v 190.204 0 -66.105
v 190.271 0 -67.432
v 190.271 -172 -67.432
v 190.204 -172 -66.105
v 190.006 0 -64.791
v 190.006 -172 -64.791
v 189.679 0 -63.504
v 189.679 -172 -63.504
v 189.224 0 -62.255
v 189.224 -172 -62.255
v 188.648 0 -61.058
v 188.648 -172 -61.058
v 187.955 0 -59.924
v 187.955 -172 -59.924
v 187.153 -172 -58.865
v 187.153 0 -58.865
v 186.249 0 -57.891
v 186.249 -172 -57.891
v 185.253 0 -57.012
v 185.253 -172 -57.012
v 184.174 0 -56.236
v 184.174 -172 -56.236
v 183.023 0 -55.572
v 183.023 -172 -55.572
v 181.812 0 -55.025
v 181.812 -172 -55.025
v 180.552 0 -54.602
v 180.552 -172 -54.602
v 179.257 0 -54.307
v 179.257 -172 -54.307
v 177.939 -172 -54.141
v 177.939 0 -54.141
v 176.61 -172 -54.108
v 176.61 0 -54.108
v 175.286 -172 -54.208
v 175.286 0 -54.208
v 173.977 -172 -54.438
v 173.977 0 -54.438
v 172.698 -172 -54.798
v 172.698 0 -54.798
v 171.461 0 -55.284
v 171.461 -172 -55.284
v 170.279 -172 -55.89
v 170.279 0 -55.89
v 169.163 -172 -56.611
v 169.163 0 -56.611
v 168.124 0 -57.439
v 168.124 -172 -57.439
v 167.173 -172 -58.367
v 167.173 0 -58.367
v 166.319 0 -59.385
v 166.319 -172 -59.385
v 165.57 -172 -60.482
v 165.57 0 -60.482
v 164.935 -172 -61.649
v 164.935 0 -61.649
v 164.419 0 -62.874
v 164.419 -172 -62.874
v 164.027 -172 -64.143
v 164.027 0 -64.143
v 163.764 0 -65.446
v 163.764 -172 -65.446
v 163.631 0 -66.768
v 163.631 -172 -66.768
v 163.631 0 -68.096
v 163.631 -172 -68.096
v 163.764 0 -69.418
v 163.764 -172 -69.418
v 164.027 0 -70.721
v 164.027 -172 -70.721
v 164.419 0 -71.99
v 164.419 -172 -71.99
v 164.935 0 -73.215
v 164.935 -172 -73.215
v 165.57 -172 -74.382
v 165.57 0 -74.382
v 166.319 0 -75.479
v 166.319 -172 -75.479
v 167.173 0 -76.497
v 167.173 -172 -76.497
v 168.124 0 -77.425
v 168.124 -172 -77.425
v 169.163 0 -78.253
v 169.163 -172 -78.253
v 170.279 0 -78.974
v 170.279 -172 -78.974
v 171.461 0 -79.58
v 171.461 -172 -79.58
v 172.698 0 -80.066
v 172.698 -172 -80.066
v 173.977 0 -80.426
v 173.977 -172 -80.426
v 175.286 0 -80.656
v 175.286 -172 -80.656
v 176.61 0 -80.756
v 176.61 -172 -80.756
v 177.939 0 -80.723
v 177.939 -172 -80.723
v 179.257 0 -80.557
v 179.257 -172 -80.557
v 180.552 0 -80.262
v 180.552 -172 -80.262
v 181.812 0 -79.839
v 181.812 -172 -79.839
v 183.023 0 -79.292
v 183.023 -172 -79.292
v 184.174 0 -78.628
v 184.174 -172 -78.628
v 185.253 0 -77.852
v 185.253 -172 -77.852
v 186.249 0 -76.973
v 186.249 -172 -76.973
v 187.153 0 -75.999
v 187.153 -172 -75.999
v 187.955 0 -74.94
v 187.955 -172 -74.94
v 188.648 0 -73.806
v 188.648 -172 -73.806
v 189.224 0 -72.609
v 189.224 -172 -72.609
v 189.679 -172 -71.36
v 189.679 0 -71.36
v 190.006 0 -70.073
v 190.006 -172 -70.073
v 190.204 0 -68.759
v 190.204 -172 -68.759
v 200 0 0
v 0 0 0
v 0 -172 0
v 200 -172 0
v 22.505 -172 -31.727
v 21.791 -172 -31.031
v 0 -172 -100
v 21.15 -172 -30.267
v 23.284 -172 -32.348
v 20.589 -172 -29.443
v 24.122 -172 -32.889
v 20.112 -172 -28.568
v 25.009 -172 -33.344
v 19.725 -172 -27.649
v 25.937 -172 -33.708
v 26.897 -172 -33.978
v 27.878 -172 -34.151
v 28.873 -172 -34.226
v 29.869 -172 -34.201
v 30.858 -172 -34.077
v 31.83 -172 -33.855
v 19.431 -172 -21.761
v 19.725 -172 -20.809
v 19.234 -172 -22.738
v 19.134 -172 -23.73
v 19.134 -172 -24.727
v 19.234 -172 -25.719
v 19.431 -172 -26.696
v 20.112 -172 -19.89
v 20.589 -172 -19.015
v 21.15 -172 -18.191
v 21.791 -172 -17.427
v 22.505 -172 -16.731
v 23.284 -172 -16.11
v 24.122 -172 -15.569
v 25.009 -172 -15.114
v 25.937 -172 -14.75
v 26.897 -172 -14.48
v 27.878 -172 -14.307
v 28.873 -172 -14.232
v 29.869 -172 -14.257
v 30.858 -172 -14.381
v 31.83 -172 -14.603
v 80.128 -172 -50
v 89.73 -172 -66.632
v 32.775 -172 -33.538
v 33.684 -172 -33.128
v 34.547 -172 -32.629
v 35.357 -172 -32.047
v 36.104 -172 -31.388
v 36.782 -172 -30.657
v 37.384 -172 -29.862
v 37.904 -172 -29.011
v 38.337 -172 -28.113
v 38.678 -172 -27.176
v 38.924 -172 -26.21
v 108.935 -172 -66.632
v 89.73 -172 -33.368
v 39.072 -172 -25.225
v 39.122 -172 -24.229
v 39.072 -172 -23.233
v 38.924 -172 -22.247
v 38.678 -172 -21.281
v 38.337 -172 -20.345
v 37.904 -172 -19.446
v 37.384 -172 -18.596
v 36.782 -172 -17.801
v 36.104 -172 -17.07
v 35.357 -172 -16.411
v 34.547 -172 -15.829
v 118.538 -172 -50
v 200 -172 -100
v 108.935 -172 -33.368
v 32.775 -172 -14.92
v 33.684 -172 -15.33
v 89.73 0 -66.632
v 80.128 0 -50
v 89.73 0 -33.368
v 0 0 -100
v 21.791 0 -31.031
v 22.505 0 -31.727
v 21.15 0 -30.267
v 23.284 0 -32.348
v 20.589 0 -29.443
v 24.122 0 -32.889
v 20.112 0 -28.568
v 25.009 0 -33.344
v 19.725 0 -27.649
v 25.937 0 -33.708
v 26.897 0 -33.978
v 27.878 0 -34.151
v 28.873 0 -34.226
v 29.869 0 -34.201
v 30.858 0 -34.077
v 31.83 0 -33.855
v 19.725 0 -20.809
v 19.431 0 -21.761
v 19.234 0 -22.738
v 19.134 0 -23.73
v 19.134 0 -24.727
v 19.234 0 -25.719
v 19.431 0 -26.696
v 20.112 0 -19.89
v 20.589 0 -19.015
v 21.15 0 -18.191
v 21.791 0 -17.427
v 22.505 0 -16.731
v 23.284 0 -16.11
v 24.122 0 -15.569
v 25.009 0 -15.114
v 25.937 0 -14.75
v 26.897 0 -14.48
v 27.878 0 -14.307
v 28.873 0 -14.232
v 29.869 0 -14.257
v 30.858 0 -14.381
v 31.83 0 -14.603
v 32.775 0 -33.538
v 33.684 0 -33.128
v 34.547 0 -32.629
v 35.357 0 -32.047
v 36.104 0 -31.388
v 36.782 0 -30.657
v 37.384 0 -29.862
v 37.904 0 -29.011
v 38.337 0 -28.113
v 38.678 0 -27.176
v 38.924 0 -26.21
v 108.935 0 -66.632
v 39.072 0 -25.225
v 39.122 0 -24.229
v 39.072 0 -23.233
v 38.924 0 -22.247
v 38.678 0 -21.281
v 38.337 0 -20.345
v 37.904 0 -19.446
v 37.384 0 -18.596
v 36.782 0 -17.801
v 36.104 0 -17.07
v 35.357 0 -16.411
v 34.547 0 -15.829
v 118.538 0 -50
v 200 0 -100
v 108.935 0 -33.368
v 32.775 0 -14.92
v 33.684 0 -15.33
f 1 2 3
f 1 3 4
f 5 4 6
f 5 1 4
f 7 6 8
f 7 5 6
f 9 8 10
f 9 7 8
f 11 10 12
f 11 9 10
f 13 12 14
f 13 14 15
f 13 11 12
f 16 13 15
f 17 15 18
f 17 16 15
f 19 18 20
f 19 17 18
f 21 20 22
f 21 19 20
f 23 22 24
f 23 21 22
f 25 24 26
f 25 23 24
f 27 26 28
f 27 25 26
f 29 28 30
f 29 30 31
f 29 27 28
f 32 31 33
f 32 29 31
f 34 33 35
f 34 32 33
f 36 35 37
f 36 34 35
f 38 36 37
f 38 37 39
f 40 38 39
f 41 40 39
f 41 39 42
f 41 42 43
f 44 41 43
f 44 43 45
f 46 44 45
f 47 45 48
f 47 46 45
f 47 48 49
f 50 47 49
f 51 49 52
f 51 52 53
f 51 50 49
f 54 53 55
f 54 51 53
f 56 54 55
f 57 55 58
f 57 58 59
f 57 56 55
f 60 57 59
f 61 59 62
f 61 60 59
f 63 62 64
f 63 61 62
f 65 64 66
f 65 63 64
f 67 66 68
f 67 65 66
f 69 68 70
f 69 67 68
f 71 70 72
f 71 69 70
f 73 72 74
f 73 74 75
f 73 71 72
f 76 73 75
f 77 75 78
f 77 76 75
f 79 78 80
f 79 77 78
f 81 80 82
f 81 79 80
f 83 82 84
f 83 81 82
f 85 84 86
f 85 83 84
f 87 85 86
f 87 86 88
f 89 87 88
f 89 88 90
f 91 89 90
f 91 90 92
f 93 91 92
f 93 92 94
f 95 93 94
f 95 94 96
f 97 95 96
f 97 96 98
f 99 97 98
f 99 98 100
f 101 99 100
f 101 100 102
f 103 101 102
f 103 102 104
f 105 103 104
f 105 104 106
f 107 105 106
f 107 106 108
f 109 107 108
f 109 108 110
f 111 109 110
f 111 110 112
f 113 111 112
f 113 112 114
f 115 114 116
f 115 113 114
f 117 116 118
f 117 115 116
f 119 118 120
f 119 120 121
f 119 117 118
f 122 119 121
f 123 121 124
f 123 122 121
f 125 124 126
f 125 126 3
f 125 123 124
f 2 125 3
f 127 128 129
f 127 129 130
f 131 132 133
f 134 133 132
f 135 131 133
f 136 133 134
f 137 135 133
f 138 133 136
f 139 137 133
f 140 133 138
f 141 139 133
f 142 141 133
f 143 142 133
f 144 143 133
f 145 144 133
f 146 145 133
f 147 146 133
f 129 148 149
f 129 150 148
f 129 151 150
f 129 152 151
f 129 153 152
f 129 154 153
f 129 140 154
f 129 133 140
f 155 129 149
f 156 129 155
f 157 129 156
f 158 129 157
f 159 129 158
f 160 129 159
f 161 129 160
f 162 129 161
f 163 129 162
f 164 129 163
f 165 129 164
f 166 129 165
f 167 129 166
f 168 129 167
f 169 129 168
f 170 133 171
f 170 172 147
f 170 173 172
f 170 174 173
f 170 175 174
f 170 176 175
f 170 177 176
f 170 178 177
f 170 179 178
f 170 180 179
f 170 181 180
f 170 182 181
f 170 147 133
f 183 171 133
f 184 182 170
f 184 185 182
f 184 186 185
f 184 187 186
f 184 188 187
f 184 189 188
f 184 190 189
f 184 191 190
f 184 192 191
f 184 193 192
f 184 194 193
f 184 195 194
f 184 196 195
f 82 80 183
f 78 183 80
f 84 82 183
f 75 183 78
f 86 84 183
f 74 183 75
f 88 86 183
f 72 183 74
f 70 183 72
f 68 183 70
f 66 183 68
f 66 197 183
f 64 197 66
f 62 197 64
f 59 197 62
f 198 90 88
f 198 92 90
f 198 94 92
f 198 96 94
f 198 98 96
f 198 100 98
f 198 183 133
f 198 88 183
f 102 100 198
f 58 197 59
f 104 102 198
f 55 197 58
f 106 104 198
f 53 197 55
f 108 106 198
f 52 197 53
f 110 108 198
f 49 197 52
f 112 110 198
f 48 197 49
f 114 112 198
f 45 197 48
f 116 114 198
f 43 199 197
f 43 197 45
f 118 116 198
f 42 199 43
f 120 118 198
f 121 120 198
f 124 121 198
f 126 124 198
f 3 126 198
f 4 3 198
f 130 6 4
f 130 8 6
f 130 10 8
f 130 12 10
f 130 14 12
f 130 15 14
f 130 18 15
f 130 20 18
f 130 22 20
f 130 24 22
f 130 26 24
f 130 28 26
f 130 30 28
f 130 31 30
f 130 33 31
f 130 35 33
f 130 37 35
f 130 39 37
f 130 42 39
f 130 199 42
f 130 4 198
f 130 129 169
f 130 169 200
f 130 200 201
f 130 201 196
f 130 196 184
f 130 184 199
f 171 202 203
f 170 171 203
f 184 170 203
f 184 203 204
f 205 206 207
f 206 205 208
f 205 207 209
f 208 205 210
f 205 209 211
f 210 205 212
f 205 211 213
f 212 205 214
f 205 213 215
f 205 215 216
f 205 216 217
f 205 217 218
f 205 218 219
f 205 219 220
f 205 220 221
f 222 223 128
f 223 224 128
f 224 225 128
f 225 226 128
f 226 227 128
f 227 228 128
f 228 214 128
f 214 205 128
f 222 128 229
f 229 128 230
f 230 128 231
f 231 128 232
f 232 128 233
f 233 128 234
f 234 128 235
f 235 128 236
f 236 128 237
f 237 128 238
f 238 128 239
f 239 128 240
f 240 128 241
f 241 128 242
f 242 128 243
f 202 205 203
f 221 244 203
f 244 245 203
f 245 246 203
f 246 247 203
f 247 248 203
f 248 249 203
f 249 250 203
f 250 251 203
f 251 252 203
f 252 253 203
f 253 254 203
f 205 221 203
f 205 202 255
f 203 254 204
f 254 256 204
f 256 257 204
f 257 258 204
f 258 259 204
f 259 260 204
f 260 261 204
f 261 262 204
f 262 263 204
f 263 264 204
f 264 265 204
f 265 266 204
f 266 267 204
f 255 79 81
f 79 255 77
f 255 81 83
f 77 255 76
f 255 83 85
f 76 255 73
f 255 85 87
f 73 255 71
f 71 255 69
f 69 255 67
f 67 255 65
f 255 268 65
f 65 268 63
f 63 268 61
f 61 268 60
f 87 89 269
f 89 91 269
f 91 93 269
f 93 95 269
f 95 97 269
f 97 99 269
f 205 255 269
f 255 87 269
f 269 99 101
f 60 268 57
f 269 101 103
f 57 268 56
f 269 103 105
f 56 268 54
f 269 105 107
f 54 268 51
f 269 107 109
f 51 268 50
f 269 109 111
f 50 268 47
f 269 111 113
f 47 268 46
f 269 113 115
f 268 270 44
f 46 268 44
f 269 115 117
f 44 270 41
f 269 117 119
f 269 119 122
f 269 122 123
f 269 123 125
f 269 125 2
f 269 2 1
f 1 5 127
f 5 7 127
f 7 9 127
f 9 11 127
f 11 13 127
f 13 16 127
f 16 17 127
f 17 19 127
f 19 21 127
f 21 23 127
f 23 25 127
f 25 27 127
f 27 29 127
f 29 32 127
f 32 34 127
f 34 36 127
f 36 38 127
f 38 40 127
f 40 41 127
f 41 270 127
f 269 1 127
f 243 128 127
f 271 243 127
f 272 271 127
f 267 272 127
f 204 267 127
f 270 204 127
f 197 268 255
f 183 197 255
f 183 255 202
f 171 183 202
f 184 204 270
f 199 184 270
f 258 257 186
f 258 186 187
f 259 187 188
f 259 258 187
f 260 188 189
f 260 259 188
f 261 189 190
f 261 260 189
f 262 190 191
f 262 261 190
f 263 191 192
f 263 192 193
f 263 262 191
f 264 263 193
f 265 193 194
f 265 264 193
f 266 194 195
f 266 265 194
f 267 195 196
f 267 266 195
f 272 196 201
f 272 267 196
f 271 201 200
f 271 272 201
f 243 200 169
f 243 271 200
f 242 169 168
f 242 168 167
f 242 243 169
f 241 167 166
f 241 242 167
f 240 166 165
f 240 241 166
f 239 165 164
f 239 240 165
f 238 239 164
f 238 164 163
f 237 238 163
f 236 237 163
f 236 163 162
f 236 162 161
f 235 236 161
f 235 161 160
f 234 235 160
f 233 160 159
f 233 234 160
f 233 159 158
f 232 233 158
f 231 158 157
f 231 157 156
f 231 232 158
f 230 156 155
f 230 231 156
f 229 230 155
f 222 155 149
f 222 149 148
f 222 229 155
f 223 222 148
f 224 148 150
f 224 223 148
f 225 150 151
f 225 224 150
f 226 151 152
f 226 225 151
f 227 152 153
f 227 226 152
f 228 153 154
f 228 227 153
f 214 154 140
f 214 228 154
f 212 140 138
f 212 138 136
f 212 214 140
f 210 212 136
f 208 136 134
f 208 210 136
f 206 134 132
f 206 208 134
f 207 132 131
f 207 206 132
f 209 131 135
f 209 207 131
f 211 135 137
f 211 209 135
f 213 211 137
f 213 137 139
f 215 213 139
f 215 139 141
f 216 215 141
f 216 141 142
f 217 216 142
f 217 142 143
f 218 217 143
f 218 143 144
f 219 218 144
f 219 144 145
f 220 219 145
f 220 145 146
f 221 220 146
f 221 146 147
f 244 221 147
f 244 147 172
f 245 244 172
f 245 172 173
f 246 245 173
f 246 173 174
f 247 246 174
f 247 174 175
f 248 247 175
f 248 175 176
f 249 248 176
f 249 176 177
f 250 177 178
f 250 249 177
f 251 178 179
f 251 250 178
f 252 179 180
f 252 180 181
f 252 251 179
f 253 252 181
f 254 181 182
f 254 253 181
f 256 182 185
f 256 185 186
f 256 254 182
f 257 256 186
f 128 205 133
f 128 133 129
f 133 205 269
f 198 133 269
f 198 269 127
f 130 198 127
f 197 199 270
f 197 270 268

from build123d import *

# Parameters (mm, degrees)
F0_W     = 200
F0_H     = 100
F0_R     = 13.327869
F0_R_2   = 10
F1_DEPTH = 172


with BuildPart() as f1:
    # F0 (on Front) → F1 (new body)
    with BuildSketch(Plane.XZ):
        with Locations((100, -50)):
            Rectangle(F0_W, F0_H)
        with Locations((176.942766, -67.431971)):
            Circle(F0_R, mode=Mode.SUBTRACT)
        Polygon((80.127939, -50), (89.730337, -33.368159), (108.935133, -33.368159), (118.537531, -50), (108.935133, -66.631841), (89.730337, -66.631841), align=None, mode=Mode.SUBTRACT)
        with Locations((29.121823, -24.228896)):
            Circle(F0_R_2, mode=Mode.SUBTRACT)
    extrude(amount=F1_DEPTH)


solid = f1.part
